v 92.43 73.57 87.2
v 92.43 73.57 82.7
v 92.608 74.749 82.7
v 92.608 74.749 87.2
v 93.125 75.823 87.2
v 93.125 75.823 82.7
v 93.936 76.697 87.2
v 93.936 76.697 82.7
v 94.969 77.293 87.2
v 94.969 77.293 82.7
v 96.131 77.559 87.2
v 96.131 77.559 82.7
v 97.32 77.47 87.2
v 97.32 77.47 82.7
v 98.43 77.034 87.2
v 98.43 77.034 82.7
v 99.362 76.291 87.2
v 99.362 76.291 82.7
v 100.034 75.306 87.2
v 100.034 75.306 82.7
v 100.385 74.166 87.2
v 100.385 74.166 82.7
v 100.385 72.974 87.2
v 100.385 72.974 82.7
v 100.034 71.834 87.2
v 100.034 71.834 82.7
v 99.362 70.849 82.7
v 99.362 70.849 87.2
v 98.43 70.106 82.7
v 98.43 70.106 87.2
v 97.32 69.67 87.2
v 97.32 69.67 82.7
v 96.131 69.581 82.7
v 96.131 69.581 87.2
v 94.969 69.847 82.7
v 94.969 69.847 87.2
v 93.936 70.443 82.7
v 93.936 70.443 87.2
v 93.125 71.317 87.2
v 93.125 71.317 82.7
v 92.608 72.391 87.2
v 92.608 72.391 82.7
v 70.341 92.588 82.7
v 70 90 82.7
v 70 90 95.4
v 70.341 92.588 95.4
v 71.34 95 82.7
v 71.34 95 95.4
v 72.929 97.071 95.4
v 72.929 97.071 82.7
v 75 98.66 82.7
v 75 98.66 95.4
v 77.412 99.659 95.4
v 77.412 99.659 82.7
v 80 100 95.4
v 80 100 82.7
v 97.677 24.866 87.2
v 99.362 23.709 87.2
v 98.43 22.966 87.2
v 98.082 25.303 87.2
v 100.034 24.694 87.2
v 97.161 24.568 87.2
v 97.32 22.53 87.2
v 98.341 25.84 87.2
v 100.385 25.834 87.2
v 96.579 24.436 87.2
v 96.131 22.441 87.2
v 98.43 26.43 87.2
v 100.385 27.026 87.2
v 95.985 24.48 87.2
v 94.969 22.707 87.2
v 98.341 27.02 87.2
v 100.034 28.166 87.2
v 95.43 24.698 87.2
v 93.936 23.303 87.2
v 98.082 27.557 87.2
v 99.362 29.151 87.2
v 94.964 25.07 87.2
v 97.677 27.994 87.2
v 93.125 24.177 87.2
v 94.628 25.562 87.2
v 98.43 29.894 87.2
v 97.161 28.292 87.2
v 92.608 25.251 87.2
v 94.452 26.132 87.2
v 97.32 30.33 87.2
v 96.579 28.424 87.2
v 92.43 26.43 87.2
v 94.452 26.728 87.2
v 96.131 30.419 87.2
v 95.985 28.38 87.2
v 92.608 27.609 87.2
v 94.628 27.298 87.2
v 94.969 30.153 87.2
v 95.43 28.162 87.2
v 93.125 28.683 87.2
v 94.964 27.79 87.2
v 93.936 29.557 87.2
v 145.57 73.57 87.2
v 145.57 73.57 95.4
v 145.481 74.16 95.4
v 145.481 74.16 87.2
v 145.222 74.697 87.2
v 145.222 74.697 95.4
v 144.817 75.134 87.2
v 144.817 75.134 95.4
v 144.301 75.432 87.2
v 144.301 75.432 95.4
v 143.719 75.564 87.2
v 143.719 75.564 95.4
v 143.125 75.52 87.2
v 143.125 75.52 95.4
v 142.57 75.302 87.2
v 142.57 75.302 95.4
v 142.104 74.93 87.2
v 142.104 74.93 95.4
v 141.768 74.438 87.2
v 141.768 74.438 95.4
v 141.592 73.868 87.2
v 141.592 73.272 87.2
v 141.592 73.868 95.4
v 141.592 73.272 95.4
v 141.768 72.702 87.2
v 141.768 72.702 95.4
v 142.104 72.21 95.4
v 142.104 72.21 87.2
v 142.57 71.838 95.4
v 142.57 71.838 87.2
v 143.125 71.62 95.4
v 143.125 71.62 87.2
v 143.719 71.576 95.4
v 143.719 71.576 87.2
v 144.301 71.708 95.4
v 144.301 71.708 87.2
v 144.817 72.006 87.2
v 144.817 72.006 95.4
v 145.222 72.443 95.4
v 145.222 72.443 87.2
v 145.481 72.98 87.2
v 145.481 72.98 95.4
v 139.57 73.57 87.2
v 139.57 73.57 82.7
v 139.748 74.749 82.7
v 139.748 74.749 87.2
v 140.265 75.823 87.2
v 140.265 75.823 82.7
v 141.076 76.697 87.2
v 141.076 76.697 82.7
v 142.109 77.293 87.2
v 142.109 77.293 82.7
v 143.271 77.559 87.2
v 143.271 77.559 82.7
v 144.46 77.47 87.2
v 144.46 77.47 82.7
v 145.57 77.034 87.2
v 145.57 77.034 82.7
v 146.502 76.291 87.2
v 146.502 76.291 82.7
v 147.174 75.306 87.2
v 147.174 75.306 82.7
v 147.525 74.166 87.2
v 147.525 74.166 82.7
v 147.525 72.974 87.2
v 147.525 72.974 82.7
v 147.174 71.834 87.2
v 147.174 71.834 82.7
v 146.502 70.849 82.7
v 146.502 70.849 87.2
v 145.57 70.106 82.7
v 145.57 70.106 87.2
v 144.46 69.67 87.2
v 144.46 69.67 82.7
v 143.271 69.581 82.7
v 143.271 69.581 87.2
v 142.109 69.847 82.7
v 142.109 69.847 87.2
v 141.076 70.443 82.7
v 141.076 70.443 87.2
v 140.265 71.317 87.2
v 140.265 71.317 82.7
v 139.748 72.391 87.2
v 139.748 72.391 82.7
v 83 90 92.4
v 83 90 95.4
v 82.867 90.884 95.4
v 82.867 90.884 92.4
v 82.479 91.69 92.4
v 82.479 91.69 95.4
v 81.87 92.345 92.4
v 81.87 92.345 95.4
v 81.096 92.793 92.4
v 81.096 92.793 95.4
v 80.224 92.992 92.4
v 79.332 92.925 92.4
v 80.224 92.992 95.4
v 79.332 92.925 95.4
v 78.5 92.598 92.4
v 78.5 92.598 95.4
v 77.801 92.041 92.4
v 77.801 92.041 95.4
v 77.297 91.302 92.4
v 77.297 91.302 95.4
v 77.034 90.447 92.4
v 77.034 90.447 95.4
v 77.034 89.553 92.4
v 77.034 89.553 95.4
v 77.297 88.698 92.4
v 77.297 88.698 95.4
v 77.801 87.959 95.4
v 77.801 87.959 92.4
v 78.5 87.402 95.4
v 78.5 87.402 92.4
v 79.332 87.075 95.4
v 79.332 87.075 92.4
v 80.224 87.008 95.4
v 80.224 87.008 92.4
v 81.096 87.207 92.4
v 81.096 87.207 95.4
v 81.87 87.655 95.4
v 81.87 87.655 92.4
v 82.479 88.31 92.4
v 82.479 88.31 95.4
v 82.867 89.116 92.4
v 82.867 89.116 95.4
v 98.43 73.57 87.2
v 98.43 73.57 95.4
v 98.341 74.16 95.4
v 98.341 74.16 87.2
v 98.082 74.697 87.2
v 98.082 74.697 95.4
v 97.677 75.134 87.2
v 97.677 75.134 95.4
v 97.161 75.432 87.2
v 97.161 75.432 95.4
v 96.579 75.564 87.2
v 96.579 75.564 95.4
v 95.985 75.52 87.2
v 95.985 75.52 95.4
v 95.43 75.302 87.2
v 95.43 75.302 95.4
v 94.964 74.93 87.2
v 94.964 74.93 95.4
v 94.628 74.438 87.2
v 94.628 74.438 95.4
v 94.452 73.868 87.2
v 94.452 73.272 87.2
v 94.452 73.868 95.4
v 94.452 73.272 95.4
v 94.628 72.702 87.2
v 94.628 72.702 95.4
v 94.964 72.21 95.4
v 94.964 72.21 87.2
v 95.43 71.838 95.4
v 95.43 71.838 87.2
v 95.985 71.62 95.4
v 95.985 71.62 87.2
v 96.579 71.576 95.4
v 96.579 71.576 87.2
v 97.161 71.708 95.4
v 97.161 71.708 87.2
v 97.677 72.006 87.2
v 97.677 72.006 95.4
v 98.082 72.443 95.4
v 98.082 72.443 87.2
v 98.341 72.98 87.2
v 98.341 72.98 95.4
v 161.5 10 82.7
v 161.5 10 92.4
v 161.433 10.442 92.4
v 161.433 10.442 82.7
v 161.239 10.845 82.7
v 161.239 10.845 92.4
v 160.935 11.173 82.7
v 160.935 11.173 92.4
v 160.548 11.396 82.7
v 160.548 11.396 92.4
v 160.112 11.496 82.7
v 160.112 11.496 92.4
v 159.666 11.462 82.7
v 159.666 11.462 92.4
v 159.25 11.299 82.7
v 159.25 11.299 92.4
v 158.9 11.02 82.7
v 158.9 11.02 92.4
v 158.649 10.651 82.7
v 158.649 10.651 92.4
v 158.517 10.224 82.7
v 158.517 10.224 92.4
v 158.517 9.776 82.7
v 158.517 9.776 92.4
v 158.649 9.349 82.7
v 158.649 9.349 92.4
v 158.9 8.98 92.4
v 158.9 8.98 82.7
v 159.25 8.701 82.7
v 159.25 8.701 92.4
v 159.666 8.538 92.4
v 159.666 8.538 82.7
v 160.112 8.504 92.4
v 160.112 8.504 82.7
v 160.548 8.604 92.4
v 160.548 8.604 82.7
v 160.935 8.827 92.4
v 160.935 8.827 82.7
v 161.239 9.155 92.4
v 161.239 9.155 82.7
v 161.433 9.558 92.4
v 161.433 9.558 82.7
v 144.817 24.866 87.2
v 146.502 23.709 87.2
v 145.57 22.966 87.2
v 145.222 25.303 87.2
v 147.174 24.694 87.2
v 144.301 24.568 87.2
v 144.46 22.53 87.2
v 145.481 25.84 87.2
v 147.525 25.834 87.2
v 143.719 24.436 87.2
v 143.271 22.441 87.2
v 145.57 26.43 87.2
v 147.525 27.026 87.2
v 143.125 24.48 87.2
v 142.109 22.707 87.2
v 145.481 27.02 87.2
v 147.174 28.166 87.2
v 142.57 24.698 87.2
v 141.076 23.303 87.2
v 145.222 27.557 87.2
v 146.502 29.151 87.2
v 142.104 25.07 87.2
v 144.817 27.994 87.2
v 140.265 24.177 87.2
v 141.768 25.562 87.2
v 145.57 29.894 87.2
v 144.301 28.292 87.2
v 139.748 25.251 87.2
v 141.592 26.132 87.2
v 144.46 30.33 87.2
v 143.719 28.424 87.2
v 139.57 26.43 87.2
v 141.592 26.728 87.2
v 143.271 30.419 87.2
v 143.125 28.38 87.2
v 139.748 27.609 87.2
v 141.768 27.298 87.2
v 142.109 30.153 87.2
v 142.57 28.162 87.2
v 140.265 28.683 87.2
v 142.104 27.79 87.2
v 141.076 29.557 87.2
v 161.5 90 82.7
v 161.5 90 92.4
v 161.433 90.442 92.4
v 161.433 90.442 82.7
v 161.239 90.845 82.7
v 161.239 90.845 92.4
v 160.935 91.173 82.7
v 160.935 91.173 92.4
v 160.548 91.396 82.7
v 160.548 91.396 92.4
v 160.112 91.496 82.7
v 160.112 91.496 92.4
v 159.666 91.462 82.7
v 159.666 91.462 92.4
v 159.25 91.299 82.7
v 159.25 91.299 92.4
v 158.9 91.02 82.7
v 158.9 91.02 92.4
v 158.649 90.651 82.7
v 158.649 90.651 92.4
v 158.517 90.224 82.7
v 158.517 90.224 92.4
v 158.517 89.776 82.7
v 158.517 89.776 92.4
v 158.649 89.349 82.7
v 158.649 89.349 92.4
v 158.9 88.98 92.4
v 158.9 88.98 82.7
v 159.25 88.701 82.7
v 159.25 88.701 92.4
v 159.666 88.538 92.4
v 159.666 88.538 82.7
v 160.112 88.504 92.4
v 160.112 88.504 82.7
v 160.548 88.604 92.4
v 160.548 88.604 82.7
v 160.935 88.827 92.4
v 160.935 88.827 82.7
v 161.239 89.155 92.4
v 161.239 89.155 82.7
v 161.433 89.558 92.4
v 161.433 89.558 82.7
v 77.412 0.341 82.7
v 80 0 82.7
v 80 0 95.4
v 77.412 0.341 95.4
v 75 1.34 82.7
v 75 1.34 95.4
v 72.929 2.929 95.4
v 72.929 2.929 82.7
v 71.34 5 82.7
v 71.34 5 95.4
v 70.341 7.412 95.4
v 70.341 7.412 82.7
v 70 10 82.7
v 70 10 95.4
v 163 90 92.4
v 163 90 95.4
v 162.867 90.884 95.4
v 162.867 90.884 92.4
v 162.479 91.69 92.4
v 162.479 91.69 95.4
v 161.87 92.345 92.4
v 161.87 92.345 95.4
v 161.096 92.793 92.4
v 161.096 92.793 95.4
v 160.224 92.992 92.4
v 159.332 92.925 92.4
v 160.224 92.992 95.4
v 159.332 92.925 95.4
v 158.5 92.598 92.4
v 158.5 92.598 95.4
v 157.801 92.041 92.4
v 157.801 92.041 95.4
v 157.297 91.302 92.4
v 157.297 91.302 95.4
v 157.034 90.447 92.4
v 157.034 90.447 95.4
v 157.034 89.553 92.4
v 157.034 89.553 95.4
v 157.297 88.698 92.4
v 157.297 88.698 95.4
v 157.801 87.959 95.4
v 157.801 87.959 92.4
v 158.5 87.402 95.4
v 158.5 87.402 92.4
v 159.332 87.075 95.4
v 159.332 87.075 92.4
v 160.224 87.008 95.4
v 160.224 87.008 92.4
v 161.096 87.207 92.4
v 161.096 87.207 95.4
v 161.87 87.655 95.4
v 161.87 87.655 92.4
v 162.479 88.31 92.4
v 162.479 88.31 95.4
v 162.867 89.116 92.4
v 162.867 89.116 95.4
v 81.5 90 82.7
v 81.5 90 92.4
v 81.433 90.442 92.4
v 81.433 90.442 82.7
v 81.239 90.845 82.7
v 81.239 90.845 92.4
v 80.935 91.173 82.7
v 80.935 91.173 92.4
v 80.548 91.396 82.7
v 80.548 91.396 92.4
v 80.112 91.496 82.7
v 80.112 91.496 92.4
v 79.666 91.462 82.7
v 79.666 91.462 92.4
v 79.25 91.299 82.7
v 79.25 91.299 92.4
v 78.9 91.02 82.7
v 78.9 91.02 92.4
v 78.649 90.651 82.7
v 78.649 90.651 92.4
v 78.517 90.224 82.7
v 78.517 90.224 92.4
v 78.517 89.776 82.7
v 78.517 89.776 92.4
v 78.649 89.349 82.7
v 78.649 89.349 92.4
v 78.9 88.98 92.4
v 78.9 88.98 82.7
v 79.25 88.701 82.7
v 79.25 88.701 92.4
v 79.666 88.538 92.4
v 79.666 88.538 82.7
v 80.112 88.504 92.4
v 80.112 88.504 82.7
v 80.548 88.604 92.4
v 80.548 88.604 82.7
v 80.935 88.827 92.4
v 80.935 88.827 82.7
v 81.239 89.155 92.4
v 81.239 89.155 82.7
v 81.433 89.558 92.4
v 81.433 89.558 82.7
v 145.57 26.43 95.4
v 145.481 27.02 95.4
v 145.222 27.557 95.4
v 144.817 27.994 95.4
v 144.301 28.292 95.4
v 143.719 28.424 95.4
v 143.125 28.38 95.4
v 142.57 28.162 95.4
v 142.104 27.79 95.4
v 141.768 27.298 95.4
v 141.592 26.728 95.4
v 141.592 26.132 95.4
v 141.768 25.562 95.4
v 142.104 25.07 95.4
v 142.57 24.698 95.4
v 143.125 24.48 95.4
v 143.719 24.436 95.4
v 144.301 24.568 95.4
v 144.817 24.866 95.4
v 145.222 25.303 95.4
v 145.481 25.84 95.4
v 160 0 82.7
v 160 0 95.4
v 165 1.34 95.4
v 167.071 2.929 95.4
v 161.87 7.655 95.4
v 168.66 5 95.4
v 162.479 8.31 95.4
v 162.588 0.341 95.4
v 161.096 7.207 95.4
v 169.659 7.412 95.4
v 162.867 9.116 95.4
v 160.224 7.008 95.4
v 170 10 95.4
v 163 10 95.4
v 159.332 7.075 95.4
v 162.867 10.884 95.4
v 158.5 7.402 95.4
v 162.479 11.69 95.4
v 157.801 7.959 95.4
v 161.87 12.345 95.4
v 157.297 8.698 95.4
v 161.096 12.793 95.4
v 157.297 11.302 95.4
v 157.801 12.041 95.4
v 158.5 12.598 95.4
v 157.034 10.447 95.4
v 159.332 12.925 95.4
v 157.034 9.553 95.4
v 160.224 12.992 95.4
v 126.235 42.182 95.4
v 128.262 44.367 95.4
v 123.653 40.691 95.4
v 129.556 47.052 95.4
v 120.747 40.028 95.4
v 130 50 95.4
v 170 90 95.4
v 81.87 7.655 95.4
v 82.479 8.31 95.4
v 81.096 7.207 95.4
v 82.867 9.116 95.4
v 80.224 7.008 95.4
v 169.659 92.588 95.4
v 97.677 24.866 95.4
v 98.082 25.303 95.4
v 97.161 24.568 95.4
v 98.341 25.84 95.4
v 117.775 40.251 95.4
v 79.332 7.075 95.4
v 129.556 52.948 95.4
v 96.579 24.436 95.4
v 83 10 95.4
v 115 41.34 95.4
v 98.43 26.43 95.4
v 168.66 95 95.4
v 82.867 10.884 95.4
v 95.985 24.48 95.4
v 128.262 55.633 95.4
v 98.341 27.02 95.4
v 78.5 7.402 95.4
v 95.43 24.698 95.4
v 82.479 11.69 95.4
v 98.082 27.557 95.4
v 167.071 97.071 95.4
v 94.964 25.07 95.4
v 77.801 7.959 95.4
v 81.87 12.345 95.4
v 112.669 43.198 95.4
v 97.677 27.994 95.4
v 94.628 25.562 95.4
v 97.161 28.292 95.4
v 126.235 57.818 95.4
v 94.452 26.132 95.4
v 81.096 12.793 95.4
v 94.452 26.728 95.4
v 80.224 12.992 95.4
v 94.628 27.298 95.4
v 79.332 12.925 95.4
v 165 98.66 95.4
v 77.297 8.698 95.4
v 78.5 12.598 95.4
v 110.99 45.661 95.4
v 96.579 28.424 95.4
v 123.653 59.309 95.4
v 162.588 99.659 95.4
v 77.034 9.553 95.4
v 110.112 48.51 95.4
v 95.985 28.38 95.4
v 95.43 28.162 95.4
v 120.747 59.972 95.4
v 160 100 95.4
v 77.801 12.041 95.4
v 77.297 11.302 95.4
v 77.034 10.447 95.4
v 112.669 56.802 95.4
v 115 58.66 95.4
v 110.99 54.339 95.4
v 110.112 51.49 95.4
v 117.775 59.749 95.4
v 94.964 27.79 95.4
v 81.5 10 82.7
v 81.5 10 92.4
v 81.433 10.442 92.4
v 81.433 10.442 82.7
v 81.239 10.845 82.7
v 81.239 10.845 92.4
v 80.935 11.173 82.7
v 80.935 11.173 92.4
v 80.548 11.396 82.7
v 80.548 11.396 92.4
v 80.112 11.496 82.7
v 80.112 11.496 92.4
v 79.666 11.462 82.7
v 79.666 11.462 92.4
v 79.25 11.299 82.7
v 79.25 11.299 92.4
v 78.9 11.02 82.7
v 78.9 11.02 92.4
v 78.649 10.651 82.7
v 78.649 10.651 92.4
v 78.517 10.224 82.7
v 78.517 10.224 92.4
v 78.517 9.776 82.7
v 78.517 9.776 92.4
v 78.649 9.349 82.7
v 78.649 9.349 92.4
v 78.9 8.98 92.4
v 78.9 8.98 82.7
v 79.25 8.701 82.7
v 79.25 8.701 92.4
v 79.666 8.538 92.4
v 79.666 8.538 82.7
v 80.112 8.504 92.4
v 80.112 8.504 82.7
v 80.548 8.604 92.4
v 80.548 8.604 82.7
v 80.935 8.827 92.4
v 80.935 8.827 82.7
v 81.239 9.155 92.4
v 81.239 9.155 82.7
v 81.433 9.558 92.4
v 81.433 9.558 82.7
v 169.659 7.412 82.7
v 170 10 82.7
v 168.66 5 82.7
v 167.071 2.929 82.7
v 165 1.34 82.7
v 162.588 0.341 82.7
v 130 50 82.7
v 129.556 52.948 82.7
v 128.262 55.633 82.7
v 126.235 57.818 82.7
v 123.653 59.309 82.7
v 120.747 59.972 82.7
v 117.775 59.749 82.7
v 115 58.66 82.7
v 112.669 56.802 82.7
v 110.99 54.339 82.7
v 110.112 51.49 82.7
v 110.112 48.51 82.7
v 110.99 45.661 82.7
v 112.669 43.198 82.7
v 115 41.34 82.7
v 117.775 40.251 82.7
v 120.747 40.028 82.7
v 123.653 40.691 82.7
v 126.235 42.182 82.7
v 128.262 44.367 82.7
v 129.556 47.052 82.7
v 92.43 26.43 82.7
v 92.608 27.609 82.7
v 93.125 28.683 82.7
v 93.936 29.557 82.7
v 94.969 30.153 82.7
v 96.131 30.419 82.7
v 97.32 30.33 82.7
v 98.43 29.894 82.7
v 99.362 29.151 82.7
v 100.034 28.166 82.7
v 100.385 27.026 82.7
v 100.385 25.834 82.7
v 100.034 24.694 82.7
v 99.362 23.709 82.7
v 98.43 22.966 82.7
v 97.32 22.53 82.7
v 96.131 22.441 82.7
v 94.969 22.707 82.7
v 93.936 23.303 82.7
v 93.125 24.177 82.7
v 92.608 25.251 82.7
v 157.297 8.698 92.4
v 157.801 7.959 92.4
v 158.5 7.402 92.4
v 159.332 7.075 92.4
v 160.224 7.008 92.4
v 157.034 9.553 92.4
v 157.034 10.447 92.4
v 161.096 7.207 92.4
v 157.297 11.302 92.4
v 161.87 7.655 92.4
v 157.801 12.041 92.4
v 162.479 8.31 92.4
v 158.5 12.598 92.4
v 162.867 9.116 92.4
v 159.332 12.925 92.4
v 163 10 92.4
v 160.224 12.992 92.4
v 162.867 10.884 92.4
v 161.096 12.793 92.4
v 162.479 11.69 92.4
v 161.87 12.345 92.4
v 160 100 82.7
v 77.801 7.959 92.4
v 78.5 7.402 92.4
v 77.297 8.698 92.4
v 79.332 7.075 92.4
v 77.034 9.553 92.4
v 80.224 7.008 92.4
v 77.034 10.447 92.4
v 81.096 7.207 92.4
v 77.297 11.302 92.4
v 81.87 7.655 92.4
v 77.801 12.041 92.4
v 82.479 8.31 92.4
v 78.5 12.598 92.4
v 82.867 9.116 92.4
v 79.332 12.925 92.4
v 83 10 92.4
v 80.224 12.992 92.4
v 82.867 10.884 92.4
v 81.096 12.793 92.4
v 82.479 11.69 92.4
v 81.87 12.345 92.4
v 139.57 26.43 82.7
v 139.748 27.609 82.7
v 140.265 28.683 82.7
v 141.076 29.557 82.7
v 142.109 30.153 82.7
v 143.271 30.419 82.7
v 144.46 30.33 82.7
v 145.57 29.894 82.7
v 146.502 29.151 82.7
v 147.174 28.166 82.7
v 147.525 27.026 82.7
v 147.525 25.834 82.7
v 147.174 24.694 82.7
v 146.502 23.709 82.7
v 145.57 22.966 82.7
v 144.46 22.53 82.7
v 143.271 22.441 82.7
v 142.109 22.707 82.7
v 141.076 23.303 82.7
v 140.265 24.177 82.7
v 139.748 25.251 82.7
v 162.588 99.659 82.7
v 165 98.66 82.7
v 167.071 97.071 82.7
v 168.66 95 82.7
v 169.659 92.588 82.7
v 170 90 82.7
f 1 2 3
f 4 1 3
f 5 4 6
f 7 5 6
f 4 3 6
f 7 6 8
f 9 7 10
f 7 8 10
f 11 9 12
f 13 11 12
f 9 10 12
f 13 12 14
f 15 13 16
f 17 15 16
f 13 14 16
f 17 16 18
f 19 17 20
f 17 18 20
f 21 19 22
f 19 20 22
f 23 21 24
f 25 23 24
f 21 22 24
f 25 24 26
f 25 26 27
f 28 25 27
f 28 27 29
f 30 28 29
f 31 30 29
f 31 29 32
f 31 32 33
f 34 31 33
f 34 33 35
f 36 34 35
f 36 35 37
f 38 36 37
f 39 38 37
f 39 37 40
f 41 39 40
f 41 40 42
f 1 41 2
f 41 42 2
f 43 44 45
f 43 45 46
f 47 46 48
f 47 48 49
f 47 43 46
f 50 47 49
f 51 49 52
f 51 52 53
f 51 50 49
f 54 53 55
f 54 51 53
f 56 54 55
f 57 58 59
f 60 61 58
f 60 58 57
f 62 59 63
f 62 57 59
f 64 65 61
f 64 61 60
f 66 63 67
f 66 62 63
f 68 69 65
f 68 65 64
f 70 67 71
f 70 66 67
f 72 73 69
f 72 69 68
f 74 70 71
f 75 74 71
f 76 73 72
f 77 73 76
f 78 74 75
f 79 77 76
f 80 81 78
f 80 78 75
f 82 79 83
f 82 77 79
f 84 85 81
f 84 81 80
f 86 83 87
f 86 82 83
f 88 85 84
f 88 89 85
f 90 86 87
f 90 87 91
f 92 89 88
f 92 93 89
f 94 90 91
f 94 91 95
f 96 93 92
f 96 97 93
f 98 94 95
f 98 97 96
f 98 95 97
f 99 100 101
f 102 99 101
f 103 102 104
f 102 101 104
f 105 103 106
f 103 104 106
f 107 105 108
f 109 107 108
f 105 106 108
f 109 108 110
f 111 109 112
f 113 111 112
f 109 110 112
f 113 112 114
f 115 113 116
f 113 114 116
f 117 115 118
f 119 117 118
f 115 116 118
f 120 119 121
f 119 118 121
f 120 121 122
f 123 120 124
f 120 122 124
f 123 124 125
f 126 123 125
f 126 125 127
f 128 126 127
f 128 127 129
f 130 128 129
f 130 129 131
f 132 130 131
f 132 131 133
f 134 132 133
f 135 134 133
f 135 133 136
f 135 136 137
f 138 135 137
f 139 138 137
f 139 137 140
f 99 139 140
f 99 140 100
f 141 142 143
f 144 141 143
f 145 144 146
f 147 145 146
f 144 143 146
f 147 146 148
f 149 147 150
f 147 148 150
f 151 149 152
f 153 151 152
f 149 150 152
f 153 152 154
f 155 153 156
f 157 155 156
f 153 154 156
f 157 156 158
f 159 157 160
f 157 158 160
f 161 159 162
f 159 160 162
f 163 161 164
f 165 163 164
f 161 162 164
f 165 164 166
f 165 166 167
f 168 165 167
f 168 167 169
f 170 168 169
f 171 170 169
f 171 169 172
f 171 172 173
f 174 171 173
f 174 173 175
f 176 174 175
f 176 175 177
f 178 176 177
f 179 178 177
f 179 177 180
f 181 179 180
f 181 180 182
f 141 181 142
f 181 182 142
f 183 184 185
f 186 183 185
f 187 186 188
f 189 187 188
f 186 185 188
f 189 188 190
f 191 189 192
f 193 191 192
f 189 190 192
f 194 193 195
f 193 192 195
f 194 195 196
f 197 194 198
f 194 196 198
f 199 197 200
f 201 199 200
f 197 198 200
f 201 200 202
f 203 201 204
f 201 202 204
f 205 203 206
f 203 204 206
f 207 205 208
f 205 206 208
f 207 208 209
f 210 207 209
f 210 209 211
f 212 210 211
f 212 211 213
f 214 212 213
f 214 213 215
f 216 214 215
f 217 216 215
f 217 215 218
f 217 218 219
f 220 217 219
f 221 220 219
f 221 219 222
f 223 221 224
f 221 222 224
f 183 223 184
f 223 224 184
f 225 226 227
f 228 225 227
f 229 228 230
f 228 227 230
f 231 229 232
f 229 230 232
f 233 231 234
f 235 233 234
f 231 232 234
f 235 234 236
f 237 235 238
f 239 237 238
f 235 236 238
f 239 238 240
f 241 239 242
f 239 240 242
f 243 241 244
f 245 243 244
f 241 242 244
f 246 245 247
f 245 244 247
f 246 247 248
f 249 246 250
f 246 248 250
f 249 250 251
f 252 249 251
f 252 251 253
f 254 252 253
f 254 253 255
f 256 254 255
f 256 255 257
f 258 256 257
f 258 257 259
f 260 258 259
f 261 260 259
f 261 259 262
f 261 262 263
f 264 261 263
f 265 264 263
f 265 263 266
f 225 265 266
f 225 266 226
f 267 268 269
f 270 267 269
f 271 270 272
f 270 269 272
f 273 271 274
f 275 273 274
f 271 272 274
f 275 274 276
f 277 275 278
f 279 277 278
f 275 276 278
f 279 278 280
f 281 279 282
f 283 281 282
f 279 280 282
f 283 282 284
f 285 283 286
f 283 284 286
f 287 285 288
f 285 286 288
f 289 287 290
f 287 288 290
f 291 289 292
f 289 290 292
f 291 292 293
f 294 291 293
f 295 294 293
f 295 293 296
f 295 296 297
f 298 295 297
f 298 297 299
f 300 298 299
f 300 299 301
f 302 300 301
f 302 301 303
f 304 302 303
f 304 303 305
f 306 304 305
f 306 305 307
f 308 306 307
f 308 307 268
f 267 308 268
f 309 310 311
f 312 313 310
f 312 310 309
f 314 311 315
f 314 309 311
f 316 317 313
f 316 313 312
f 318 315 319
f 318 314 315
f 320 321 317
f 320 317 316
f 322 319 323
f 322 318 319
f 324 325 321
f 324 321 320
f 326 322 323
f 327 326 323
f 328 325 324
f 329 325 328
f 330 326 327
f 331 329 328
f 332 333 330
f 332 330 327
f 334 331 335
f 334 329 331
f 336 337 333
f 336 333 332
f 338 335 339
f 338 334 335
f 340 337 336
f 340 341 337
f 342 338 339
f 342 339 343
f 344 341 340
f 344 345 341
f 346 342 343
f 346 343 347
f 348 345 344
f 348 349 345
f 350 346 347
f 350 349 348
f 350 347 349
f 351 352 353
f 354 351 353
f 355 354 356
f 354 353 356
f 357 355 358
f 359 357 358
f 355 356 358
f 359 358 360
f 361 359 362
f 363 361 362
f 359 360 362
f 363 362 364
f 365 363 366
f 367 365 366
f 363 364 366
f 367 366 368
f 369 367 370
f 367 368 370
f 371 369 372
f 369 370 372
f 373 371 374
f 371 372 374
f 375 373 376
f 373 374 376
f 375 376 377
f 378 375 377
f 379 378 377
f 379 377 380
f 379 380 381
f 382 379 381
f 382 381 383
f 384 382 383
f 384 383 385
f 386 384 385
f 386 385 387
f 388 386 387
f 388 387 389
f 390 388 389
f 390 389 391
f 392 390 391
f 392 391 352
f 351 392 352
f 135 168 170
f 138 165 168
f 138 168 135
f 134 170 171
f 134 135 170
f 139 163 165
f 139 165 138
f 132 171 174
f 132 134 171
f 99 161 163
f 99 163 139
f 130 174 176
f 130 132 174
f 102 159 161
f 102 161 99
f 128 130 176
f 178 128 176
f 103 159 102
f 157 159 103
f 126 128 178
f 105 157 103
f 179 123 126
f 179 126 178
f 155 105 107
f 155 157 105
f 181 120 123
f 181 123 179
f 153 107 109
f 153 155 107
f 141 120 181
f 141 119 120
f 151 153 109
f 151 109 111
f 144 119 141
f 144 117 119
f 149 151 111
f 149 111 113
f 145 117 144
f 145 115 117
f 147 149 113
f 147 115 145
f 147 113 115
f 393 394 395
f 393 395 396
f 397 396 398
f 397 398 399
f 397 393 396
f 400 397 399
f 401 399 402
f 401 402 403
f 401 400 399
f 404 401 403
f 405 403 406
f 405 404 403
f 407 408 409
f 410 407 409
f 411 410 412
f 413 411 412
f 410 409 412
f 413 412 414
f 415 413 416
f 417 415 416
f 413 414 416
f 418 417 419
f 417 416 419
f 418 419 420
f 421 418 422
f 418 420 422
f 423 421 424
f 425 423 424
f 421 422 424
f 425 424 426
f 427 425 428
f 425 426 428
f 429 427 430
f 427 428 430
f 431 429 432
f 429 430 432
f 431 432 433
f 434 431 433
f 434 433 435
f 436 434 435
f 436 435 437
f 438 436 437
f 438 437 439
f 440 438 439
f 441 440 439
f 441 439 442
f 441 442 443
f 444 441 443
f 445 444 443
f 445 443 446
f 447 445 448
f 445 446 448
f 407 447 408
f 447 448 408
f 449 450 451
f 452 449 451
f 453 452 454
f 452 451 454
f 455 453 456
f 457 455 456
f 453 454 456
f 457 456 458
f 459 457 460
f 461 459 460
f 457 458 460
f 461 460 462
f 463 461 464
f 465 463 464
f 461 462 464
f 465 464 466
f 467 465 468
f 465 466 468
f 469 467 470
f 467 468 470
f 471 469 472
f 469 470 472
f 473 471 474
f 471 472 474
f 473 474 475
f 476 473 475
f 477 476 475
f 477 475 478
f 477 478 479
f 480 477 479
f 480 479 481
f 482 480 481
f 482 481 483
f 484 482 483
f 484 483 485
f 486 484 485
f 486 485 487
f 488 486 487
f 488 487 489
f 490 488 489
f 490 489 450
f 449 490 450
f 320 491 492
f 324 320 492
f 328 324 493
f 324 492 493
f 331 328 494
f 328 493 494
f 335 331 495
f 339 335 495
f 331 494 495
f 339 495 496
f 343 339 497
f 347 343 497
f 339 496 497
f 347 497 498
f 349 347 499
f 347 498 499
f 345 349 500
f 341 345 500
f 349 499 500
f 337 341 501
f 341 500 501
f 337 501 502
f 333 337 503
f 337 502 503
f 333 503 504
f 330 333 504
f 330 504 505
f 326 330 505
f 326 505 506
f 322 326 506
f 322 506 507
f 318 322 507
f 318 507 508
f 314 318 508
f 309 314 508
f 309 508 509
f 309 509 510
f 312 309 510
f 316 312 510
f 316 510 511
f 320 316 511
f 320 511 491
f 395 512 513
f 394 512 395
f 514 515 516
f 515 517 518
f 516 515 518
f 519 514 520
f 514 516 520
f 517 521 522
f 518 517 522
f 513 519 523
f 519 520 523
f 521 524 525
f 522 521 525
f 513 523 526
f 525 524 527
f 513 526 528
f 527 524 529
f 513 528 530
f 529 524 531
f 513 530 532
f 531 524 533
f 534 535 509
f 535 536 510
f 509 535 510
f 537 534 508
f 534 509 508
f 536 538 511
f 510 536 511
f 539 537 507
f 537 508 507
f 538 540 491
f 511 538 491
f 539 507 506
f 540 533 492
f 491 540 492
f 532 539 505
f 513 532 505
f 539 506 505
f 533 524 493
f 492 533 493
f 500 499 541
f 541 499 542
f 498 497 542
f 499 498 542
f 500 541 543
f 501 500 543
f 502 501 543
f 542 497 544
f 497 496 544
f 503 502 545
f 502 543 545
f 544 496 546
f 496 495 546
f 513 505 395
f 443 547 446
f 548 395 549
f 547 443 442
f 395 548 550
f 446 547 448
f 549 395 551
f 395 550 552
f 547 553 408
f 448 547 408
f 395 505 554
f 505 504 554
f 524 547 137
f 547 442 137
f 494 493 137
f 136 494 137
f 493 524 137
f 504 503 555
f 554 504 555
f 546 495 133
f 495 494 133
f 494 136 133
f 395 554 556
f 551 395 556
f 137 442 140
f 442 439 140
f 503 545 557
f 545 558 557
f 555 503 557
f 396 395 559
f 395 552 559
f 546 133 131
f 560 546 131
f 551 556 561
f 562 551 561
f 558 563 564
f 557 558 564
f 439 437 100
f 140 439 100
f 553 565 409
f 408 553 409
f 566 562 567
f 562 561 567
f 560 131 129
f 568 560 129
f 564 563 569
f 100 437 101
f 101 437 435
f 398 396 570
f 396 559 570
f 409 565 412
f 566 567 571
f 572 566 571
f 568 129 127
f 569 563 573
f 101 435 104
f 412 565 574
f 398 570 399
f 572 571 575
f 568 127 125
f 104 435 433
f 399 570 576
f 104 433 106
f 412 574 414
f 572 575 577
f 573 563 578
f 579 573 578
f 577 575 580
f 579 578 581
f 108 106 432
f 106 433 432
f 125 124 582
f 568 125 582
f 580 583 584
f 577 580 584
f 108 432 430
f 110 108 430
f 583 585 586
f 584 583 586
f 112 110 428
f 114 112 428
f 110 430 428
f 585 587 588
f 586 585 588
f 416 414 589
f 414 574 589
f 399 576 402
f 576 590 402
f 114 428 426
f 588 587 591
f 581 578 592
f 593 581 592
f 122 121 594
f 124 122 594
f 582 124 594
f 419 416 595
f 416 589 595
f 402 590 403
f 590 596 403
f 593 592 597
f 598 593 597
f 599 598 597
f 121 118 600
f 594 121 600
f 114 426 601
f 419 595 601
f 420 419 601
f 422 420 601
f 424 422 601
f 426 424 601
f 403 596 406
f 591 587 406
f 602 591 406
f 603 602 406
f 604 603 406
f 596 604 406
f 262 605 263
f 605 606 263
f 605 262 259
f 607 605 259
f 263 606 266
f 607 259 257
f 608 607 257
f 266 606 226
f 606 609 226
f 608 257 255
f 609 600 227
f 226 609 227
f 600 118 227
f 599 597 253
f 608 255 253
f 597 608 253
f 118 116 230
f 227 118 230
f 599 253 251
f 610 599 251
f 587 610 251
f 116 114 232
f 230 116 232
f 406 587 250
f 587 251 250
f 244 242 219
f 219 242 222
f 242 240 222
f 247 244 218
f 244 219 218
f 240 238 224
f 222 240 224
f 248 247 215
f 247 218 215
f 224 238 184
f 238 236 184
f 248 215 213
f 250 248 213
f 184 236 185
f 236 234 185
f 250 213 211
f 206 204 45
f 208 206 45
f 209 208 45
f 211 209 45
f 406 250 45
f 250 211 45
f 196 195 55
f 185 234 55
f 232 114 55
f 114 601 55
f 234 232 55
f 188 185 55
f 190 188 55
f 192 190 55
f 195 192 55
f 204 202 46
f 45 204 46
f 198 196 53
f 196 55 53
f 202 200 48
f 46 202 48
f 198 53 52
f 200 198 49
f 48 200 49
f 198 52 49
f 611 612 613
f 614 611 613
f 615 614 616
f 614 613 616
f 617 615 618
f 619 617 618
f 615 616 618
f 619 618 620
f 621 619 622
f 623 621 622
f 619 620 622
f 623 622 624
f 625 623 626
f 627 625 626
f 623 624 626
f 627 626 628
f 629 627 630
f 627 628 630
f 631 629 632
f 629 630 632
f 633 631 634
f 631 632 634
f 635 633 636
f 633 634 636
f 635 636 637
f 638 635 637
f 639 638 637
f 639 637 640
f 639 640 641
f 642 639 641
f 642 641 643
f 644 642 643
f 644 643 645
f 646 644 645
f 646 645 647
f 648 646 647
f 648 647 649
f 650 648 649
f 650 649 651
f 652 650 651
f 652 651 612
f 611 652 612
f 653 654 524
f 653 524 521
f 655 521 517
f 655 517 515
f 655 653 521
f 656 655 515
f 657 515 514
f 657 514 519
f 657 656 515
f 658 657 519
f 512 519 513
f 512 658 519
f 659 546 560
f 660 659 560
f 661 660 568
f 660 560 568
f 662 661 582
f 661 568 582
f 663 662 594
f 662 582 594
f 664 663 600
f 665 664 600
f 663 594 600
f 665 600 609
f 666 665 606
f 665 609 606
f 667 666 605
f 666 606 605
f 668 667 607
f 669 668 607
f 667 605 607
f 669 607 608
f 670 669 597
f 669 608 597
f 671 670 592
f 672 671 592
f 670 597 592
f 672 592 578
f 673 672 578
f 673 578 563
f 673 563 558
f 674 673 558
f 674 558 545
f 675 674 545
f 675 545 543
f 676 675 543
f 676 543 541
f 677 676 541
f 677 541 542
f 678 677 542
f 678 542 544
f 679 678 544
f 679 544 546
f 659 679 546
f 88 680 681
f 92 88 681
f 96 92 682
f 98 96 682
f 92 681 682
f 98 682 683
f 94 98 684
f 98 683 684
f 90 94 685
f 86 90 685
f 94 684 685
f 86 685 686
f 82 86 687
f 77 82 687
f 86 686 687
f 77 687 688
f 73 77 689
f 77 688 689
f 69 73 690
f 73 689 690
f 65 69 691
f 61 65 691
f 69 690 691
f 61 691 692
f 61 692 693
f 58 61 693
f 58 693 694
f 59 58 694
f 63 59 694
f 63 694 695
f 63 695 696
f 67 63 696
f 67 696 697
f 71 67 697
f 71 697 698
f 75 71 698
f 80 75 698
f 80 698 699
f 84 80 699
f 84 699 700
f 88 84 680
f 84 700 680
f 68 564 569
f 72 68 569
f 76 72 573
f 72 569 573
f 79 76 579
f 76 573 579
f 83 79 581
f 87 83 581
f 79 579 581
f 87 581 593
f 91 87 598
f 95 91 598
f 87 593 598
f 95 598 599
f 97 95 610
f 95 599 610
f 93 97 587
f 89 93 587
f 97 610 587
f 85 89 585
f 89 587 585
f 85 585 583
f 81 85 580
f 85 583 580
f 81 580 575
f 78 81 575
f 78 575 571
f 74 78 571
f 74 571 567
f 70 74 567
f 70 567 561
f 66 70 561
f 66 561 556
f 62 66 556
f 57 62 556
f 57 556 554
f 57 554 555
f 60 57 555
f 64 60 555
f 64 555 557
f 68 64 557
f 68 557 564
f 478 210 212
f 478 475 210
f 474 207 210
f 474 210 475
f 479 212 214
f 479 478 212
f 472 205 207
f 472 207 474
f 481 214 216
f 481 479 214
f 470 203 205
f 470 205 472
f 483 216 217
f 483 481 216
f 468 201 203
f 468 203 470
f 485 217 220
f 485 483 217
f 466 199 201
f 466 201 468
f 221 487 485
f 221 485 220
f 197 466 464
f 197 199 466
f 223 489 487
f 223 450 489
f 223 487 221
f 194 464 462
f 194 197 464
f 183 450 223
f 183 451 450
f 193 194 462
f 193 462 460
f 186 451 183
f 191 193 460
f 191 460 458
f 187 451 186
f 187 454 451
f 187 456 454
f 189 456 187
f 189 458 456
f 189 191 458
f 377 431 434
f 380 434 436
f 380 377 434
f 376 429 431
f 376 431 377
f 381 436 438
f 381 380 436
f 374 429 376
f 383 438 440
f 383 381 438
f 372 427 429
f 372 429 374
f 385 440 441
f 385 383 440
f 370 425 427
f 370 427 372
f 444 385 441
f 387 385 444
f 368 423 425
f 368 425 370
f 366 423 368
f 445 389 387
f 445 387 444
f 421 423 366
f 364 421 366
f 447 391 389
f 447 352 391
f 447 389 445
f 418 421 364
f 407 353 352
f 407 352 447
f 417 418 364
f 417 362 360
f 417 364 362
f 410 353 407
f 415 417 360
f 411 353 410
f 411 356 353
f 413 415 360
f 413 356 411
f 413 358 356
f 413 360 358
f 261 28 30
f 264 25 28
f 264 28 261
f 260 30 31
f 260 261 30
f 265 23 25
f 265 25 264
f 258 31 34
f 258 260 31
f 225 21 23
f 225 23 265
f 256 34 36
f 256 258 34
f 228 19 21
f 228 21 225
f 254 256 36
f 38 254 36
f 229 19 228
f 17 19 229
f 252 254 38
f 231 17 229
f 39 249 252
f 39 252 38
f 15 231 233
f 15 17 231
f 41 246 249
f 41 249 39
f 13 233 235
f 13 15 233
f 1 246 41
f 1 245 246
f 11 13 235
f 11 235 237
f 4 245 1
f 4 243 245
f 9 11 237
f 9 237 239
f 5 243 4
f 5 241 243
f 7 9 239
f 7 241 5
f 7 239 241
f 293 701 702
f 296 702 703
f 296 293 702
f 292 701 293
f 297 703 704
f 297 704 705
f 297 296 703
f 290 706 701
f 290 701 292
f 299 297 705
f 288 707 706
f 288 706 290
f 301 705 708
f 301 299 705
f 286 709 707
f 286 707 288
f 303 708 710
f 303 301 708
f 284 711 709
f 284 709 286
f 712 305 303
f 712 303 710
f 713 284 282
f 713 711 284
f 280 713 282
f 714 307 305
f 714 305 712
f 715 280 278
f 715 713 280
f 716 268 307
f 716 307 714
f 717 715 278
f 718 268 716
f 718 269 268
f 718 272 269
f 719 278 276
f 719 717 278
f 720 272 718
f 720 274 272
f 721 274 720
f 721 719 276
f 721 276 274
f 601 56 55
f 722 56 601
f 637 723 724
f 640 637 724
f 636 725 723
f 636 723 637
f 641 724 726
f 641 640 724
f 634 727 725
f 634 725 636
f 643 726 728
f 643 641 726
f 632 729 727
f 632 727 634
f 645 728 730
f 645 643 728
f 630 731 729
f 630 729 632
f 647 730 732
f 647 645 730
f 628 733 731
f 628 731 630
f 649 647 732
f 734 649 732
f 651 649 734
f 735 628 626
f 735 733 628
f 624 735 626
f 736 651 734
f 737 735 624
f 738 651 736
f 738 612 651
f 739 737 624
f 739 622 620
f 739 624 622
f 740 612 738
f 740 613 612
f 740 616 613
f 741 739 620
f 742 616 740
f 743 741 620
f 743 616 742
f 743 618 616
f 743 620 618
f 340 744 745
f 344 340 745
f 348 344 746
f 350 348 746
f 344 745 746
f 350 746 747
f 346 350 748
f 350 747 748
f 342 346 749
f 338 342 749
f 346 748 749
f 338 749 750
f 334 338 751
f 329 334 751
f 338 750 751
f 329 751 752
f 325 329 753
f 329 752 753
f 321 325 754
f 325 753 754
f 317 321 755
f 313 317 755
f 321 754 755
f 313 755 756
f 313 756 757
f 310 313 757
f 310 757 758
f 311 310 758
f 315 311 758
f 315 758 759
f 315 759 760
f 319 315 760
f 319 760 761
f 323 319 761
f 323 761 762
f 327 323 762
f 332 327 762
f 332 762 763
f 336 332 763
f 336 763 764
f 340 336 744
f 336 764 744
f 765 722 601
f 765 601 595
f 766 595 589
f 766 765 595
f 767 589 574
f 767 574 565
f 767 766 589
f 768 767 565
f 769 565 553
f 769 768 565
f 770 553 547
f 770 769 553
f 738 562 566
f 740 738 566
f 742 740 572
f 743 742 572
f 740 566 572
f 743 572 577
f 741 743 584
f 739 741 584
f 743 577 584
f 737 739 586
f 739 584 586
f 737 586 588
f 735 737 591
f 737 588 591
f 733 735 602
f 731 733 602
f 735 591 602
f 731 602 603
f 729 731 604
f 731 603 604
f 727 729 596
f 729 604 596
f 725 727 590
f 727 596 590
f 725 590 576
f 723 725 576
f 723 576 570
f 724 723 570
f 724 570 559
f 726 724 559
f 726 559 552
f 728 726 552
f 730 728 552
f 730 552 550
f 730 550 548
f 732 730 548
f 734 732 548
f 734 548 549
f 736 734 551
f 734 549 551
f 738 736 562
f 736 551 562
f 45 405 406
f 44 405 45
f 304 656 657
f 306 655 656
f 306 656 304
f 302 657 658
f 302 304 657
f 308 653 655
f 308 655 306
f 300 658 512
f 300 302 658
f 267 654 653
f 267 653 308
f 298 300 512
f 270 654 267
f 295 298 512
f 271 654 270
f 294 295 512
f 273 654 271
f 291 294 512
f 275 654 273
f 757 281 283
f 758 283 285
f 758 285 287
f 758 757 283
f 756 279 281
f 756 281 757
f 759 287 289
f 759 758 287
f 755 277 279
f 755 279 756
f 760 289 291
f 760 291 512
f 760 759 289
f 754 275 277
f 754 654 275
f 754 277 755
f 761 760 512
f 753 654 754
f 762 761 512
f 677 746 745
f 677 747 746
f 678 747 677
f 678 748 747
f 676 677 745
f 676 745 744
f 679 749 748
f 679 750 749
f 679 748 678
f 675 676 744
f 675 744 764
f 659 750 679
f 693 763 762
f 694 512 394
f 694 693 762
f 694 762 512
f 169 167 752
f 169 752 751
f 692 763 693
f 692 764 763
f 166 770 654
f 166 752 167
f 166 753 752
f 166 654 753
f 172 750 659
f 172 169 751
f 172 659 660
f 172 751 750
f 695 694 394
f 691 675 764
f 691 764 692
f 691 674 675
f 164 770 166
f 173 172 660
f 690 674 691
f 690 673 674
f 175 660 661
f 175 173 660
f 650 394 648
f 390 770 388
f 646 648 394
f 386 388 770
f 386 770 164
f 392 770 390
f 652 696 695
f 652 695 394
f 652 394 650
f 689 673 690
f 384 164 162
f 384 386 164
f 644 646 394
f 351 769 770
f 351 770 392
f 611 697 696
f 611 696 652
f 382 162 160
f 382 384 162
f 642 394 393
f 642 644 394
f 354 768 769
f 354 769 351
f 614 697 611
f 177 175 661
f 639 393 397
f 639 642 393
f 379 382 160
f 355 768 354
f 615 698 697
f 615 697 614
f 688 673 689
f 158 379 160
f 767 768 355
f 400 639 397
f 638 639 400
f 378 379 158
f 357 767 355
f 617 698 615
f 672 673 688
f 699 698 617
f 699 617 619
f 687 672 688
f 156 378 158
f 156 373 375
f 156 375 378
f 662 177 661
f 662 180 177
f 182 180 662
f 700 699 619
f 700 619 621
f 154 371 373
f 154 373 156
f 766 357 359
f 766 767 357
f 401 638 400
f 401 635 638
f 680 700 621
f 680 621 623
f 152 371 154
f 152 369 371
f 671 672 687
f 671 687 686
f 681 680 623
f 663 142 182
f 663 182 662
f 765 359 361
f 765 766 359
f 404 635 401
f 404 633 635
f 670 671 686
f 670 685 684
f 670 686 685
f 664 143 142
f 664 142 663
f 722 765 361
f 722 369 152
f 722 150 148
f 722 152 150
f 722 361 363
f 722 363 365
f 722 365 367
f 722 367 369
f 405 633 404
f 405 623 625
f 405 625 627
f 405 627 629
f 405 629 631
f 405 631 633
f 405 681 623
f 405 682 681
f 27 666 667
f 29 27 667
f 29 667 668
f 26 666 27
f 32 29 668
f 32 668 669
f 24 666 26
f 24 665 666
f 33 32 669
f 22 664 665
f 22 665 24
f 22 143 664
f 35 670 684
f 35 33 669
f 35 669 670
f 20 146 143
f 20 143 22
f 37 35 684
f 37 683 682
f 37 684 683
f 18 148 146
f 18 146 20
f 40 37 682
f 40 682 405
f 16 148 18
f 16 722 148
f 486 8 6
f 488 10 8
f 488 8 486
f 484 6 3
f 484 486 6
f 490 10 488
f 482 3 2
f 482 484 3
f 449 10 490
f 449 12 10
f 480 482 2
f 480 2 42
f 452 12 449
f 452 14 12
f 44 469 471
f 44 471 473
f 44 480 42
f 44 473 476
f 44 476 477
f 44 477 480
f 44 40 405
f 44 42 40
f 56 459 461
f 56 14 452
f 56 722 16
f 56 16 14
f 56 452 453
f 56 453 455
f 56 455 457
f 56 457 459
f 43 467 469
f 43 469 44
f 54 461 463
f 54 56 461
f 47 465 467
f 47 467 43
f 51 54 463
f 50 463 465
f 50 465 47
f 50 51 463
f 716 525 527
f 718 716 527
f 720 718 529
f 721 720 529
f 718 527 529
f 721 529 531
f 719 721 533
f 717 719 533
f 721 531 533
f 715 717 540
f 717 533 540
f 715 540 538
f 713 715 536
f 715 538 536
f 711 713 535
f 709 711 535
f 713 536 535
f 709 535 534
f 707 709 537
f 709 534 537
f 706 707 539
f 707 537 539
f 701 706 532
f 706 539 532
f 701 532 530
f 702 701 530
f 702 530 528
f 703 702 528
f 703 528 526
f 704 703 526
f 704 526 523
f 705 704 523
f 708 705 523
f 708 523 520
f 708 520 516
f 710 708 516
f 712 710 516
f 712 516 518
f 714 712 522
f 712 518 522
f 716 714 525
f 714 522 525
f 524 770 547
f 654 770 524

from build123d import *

# Parameters (mm, degrees)
SALIENTE_EXTRUIR4_START = 70
SALIENTE_EXTRUIR4_DEPTH = 12.7
CROQUIS8_R              = 3
CORTAR_EXTRUIR1_DEPTH   = 3
CROQUIS13_R             = 1.5
CORTAR_EXTRUIR4_DEPTH   = 30
CROQUIS16_R             = 10
CROQUIS16_R_2           = 2
CORTAR_EXTRUIR6_DEPTH   = 31
CROQUIS21_R             = 4
CORTAR_EXTRUIR12_DEPTH  = 4.5


with BuildPart() as part:
    # Croquis5 → Saliente-Extruir4 (new body)
    with BuildSketch(Plane.XY.offset(12.7).offset(SALIENTE_EXTRUIR4_START)):
        with BuildLine():
            Line((160, 0), (80, 0))
            ThreePointArc((80, 0), (72.928932188, 2.928932188), (70, 10))
            Line((70, 10), (70, 90))
            ThreePointArc((70, 90), (72.928932188, 97.071067812), (80, 100))
            Line((80, 100), (160, 100))
            ThreePointArc((160, 100), (167.071067812, 97.071067812), (170, 90))
            Line((170, 90), (170, 10))
            ThreePointArc((170, 10), (167.071067812, 2.928932188), (160, 0))
        make_face()
    extrude(amount=SALIENTE_EXTRUIR4_DEPTH)

    # Croquis8 → Cortar-Extruir1 (cut)
    with BuildSketch(Plane.XY.offset(95.4)):
        with Locations((80, 90)):
            Circle(CROQUIS8_R)
        with Locations((160, 90)):
            Circle(CROQUIS8_R)
        with Locations((160, 10)):
            Circle(CROQUIS8_R)
        with Locations((80, 10)):
            Circle(CROQUIS8_R)
    extrude(amount=-CORTAR_EXTRUIR1_DEPTH, mode=Mode.SUBTRACT)

    # Croquis13 → Cortar-Extruir4 (cut)
    with BuildSketch(Plane.XY.offset(95.4)):
        with Locations((80, 90)):
            Circle(CROQUIS13_R)
        with Locations((160, 90)):
            Circle(CROQUIS13_R)
        with Locations((160, 10)):
            Circle(CROQUIS13_R)
        with Locations((80, 10)):
            Circle(CROQUIS13_R)
    extrude(amount=-CORTAR_EXTRUIR4_DEPTH, mode=Mode.SUBTRACT)

    # Croquis16 → Cortar-Extruir6 (cut)
    with BuildSketch(Plane.XY.offset(95.4)):
        with Locations((120, 50)):
            Circle(CROQUIS16_R)
        with Locations((96.43, 73.57)):
            Circle(CROQUIS16_R_2)
        with Locations((143.57, 73.57)):
            Circle(CROQUIS16_R_2)
        with Locations((96.43, 26.43)):
            Circle(CROQUIS16_R_2)
        with Locations((143.57, 26.43)):
            Circle(CROQUIS16_R_2)
    extrude(amount=-CORTAR_EXTRUIR6_DEPTH, mode=Mode.SUBTRACT)

    # Croquis21 → Cortar-Extruir12 (cut)
    with BuildSketch(Plane(origin=(0, 0, 82.7), x_dir=(-1, 0, 0), z_dir=(0, 0, -1))):
        with Locations((-143.57, 73.57)):
            Circle(CROQUIS21_R)
        with Locations((-96.43, 73.57)):
            Circle(CROQUIS21_R)
        with Locations((-143.57, 26.43)):
            Circle(CROQUIS21_R)
        with Locations((-96.43, 26.43)):
            Circle(CROQUIS21_R)
    extrude(amount=-CORTAR_EXTRUIR12_DEPTH, mode=Mode.SUBTRACT)


solid = part.part
